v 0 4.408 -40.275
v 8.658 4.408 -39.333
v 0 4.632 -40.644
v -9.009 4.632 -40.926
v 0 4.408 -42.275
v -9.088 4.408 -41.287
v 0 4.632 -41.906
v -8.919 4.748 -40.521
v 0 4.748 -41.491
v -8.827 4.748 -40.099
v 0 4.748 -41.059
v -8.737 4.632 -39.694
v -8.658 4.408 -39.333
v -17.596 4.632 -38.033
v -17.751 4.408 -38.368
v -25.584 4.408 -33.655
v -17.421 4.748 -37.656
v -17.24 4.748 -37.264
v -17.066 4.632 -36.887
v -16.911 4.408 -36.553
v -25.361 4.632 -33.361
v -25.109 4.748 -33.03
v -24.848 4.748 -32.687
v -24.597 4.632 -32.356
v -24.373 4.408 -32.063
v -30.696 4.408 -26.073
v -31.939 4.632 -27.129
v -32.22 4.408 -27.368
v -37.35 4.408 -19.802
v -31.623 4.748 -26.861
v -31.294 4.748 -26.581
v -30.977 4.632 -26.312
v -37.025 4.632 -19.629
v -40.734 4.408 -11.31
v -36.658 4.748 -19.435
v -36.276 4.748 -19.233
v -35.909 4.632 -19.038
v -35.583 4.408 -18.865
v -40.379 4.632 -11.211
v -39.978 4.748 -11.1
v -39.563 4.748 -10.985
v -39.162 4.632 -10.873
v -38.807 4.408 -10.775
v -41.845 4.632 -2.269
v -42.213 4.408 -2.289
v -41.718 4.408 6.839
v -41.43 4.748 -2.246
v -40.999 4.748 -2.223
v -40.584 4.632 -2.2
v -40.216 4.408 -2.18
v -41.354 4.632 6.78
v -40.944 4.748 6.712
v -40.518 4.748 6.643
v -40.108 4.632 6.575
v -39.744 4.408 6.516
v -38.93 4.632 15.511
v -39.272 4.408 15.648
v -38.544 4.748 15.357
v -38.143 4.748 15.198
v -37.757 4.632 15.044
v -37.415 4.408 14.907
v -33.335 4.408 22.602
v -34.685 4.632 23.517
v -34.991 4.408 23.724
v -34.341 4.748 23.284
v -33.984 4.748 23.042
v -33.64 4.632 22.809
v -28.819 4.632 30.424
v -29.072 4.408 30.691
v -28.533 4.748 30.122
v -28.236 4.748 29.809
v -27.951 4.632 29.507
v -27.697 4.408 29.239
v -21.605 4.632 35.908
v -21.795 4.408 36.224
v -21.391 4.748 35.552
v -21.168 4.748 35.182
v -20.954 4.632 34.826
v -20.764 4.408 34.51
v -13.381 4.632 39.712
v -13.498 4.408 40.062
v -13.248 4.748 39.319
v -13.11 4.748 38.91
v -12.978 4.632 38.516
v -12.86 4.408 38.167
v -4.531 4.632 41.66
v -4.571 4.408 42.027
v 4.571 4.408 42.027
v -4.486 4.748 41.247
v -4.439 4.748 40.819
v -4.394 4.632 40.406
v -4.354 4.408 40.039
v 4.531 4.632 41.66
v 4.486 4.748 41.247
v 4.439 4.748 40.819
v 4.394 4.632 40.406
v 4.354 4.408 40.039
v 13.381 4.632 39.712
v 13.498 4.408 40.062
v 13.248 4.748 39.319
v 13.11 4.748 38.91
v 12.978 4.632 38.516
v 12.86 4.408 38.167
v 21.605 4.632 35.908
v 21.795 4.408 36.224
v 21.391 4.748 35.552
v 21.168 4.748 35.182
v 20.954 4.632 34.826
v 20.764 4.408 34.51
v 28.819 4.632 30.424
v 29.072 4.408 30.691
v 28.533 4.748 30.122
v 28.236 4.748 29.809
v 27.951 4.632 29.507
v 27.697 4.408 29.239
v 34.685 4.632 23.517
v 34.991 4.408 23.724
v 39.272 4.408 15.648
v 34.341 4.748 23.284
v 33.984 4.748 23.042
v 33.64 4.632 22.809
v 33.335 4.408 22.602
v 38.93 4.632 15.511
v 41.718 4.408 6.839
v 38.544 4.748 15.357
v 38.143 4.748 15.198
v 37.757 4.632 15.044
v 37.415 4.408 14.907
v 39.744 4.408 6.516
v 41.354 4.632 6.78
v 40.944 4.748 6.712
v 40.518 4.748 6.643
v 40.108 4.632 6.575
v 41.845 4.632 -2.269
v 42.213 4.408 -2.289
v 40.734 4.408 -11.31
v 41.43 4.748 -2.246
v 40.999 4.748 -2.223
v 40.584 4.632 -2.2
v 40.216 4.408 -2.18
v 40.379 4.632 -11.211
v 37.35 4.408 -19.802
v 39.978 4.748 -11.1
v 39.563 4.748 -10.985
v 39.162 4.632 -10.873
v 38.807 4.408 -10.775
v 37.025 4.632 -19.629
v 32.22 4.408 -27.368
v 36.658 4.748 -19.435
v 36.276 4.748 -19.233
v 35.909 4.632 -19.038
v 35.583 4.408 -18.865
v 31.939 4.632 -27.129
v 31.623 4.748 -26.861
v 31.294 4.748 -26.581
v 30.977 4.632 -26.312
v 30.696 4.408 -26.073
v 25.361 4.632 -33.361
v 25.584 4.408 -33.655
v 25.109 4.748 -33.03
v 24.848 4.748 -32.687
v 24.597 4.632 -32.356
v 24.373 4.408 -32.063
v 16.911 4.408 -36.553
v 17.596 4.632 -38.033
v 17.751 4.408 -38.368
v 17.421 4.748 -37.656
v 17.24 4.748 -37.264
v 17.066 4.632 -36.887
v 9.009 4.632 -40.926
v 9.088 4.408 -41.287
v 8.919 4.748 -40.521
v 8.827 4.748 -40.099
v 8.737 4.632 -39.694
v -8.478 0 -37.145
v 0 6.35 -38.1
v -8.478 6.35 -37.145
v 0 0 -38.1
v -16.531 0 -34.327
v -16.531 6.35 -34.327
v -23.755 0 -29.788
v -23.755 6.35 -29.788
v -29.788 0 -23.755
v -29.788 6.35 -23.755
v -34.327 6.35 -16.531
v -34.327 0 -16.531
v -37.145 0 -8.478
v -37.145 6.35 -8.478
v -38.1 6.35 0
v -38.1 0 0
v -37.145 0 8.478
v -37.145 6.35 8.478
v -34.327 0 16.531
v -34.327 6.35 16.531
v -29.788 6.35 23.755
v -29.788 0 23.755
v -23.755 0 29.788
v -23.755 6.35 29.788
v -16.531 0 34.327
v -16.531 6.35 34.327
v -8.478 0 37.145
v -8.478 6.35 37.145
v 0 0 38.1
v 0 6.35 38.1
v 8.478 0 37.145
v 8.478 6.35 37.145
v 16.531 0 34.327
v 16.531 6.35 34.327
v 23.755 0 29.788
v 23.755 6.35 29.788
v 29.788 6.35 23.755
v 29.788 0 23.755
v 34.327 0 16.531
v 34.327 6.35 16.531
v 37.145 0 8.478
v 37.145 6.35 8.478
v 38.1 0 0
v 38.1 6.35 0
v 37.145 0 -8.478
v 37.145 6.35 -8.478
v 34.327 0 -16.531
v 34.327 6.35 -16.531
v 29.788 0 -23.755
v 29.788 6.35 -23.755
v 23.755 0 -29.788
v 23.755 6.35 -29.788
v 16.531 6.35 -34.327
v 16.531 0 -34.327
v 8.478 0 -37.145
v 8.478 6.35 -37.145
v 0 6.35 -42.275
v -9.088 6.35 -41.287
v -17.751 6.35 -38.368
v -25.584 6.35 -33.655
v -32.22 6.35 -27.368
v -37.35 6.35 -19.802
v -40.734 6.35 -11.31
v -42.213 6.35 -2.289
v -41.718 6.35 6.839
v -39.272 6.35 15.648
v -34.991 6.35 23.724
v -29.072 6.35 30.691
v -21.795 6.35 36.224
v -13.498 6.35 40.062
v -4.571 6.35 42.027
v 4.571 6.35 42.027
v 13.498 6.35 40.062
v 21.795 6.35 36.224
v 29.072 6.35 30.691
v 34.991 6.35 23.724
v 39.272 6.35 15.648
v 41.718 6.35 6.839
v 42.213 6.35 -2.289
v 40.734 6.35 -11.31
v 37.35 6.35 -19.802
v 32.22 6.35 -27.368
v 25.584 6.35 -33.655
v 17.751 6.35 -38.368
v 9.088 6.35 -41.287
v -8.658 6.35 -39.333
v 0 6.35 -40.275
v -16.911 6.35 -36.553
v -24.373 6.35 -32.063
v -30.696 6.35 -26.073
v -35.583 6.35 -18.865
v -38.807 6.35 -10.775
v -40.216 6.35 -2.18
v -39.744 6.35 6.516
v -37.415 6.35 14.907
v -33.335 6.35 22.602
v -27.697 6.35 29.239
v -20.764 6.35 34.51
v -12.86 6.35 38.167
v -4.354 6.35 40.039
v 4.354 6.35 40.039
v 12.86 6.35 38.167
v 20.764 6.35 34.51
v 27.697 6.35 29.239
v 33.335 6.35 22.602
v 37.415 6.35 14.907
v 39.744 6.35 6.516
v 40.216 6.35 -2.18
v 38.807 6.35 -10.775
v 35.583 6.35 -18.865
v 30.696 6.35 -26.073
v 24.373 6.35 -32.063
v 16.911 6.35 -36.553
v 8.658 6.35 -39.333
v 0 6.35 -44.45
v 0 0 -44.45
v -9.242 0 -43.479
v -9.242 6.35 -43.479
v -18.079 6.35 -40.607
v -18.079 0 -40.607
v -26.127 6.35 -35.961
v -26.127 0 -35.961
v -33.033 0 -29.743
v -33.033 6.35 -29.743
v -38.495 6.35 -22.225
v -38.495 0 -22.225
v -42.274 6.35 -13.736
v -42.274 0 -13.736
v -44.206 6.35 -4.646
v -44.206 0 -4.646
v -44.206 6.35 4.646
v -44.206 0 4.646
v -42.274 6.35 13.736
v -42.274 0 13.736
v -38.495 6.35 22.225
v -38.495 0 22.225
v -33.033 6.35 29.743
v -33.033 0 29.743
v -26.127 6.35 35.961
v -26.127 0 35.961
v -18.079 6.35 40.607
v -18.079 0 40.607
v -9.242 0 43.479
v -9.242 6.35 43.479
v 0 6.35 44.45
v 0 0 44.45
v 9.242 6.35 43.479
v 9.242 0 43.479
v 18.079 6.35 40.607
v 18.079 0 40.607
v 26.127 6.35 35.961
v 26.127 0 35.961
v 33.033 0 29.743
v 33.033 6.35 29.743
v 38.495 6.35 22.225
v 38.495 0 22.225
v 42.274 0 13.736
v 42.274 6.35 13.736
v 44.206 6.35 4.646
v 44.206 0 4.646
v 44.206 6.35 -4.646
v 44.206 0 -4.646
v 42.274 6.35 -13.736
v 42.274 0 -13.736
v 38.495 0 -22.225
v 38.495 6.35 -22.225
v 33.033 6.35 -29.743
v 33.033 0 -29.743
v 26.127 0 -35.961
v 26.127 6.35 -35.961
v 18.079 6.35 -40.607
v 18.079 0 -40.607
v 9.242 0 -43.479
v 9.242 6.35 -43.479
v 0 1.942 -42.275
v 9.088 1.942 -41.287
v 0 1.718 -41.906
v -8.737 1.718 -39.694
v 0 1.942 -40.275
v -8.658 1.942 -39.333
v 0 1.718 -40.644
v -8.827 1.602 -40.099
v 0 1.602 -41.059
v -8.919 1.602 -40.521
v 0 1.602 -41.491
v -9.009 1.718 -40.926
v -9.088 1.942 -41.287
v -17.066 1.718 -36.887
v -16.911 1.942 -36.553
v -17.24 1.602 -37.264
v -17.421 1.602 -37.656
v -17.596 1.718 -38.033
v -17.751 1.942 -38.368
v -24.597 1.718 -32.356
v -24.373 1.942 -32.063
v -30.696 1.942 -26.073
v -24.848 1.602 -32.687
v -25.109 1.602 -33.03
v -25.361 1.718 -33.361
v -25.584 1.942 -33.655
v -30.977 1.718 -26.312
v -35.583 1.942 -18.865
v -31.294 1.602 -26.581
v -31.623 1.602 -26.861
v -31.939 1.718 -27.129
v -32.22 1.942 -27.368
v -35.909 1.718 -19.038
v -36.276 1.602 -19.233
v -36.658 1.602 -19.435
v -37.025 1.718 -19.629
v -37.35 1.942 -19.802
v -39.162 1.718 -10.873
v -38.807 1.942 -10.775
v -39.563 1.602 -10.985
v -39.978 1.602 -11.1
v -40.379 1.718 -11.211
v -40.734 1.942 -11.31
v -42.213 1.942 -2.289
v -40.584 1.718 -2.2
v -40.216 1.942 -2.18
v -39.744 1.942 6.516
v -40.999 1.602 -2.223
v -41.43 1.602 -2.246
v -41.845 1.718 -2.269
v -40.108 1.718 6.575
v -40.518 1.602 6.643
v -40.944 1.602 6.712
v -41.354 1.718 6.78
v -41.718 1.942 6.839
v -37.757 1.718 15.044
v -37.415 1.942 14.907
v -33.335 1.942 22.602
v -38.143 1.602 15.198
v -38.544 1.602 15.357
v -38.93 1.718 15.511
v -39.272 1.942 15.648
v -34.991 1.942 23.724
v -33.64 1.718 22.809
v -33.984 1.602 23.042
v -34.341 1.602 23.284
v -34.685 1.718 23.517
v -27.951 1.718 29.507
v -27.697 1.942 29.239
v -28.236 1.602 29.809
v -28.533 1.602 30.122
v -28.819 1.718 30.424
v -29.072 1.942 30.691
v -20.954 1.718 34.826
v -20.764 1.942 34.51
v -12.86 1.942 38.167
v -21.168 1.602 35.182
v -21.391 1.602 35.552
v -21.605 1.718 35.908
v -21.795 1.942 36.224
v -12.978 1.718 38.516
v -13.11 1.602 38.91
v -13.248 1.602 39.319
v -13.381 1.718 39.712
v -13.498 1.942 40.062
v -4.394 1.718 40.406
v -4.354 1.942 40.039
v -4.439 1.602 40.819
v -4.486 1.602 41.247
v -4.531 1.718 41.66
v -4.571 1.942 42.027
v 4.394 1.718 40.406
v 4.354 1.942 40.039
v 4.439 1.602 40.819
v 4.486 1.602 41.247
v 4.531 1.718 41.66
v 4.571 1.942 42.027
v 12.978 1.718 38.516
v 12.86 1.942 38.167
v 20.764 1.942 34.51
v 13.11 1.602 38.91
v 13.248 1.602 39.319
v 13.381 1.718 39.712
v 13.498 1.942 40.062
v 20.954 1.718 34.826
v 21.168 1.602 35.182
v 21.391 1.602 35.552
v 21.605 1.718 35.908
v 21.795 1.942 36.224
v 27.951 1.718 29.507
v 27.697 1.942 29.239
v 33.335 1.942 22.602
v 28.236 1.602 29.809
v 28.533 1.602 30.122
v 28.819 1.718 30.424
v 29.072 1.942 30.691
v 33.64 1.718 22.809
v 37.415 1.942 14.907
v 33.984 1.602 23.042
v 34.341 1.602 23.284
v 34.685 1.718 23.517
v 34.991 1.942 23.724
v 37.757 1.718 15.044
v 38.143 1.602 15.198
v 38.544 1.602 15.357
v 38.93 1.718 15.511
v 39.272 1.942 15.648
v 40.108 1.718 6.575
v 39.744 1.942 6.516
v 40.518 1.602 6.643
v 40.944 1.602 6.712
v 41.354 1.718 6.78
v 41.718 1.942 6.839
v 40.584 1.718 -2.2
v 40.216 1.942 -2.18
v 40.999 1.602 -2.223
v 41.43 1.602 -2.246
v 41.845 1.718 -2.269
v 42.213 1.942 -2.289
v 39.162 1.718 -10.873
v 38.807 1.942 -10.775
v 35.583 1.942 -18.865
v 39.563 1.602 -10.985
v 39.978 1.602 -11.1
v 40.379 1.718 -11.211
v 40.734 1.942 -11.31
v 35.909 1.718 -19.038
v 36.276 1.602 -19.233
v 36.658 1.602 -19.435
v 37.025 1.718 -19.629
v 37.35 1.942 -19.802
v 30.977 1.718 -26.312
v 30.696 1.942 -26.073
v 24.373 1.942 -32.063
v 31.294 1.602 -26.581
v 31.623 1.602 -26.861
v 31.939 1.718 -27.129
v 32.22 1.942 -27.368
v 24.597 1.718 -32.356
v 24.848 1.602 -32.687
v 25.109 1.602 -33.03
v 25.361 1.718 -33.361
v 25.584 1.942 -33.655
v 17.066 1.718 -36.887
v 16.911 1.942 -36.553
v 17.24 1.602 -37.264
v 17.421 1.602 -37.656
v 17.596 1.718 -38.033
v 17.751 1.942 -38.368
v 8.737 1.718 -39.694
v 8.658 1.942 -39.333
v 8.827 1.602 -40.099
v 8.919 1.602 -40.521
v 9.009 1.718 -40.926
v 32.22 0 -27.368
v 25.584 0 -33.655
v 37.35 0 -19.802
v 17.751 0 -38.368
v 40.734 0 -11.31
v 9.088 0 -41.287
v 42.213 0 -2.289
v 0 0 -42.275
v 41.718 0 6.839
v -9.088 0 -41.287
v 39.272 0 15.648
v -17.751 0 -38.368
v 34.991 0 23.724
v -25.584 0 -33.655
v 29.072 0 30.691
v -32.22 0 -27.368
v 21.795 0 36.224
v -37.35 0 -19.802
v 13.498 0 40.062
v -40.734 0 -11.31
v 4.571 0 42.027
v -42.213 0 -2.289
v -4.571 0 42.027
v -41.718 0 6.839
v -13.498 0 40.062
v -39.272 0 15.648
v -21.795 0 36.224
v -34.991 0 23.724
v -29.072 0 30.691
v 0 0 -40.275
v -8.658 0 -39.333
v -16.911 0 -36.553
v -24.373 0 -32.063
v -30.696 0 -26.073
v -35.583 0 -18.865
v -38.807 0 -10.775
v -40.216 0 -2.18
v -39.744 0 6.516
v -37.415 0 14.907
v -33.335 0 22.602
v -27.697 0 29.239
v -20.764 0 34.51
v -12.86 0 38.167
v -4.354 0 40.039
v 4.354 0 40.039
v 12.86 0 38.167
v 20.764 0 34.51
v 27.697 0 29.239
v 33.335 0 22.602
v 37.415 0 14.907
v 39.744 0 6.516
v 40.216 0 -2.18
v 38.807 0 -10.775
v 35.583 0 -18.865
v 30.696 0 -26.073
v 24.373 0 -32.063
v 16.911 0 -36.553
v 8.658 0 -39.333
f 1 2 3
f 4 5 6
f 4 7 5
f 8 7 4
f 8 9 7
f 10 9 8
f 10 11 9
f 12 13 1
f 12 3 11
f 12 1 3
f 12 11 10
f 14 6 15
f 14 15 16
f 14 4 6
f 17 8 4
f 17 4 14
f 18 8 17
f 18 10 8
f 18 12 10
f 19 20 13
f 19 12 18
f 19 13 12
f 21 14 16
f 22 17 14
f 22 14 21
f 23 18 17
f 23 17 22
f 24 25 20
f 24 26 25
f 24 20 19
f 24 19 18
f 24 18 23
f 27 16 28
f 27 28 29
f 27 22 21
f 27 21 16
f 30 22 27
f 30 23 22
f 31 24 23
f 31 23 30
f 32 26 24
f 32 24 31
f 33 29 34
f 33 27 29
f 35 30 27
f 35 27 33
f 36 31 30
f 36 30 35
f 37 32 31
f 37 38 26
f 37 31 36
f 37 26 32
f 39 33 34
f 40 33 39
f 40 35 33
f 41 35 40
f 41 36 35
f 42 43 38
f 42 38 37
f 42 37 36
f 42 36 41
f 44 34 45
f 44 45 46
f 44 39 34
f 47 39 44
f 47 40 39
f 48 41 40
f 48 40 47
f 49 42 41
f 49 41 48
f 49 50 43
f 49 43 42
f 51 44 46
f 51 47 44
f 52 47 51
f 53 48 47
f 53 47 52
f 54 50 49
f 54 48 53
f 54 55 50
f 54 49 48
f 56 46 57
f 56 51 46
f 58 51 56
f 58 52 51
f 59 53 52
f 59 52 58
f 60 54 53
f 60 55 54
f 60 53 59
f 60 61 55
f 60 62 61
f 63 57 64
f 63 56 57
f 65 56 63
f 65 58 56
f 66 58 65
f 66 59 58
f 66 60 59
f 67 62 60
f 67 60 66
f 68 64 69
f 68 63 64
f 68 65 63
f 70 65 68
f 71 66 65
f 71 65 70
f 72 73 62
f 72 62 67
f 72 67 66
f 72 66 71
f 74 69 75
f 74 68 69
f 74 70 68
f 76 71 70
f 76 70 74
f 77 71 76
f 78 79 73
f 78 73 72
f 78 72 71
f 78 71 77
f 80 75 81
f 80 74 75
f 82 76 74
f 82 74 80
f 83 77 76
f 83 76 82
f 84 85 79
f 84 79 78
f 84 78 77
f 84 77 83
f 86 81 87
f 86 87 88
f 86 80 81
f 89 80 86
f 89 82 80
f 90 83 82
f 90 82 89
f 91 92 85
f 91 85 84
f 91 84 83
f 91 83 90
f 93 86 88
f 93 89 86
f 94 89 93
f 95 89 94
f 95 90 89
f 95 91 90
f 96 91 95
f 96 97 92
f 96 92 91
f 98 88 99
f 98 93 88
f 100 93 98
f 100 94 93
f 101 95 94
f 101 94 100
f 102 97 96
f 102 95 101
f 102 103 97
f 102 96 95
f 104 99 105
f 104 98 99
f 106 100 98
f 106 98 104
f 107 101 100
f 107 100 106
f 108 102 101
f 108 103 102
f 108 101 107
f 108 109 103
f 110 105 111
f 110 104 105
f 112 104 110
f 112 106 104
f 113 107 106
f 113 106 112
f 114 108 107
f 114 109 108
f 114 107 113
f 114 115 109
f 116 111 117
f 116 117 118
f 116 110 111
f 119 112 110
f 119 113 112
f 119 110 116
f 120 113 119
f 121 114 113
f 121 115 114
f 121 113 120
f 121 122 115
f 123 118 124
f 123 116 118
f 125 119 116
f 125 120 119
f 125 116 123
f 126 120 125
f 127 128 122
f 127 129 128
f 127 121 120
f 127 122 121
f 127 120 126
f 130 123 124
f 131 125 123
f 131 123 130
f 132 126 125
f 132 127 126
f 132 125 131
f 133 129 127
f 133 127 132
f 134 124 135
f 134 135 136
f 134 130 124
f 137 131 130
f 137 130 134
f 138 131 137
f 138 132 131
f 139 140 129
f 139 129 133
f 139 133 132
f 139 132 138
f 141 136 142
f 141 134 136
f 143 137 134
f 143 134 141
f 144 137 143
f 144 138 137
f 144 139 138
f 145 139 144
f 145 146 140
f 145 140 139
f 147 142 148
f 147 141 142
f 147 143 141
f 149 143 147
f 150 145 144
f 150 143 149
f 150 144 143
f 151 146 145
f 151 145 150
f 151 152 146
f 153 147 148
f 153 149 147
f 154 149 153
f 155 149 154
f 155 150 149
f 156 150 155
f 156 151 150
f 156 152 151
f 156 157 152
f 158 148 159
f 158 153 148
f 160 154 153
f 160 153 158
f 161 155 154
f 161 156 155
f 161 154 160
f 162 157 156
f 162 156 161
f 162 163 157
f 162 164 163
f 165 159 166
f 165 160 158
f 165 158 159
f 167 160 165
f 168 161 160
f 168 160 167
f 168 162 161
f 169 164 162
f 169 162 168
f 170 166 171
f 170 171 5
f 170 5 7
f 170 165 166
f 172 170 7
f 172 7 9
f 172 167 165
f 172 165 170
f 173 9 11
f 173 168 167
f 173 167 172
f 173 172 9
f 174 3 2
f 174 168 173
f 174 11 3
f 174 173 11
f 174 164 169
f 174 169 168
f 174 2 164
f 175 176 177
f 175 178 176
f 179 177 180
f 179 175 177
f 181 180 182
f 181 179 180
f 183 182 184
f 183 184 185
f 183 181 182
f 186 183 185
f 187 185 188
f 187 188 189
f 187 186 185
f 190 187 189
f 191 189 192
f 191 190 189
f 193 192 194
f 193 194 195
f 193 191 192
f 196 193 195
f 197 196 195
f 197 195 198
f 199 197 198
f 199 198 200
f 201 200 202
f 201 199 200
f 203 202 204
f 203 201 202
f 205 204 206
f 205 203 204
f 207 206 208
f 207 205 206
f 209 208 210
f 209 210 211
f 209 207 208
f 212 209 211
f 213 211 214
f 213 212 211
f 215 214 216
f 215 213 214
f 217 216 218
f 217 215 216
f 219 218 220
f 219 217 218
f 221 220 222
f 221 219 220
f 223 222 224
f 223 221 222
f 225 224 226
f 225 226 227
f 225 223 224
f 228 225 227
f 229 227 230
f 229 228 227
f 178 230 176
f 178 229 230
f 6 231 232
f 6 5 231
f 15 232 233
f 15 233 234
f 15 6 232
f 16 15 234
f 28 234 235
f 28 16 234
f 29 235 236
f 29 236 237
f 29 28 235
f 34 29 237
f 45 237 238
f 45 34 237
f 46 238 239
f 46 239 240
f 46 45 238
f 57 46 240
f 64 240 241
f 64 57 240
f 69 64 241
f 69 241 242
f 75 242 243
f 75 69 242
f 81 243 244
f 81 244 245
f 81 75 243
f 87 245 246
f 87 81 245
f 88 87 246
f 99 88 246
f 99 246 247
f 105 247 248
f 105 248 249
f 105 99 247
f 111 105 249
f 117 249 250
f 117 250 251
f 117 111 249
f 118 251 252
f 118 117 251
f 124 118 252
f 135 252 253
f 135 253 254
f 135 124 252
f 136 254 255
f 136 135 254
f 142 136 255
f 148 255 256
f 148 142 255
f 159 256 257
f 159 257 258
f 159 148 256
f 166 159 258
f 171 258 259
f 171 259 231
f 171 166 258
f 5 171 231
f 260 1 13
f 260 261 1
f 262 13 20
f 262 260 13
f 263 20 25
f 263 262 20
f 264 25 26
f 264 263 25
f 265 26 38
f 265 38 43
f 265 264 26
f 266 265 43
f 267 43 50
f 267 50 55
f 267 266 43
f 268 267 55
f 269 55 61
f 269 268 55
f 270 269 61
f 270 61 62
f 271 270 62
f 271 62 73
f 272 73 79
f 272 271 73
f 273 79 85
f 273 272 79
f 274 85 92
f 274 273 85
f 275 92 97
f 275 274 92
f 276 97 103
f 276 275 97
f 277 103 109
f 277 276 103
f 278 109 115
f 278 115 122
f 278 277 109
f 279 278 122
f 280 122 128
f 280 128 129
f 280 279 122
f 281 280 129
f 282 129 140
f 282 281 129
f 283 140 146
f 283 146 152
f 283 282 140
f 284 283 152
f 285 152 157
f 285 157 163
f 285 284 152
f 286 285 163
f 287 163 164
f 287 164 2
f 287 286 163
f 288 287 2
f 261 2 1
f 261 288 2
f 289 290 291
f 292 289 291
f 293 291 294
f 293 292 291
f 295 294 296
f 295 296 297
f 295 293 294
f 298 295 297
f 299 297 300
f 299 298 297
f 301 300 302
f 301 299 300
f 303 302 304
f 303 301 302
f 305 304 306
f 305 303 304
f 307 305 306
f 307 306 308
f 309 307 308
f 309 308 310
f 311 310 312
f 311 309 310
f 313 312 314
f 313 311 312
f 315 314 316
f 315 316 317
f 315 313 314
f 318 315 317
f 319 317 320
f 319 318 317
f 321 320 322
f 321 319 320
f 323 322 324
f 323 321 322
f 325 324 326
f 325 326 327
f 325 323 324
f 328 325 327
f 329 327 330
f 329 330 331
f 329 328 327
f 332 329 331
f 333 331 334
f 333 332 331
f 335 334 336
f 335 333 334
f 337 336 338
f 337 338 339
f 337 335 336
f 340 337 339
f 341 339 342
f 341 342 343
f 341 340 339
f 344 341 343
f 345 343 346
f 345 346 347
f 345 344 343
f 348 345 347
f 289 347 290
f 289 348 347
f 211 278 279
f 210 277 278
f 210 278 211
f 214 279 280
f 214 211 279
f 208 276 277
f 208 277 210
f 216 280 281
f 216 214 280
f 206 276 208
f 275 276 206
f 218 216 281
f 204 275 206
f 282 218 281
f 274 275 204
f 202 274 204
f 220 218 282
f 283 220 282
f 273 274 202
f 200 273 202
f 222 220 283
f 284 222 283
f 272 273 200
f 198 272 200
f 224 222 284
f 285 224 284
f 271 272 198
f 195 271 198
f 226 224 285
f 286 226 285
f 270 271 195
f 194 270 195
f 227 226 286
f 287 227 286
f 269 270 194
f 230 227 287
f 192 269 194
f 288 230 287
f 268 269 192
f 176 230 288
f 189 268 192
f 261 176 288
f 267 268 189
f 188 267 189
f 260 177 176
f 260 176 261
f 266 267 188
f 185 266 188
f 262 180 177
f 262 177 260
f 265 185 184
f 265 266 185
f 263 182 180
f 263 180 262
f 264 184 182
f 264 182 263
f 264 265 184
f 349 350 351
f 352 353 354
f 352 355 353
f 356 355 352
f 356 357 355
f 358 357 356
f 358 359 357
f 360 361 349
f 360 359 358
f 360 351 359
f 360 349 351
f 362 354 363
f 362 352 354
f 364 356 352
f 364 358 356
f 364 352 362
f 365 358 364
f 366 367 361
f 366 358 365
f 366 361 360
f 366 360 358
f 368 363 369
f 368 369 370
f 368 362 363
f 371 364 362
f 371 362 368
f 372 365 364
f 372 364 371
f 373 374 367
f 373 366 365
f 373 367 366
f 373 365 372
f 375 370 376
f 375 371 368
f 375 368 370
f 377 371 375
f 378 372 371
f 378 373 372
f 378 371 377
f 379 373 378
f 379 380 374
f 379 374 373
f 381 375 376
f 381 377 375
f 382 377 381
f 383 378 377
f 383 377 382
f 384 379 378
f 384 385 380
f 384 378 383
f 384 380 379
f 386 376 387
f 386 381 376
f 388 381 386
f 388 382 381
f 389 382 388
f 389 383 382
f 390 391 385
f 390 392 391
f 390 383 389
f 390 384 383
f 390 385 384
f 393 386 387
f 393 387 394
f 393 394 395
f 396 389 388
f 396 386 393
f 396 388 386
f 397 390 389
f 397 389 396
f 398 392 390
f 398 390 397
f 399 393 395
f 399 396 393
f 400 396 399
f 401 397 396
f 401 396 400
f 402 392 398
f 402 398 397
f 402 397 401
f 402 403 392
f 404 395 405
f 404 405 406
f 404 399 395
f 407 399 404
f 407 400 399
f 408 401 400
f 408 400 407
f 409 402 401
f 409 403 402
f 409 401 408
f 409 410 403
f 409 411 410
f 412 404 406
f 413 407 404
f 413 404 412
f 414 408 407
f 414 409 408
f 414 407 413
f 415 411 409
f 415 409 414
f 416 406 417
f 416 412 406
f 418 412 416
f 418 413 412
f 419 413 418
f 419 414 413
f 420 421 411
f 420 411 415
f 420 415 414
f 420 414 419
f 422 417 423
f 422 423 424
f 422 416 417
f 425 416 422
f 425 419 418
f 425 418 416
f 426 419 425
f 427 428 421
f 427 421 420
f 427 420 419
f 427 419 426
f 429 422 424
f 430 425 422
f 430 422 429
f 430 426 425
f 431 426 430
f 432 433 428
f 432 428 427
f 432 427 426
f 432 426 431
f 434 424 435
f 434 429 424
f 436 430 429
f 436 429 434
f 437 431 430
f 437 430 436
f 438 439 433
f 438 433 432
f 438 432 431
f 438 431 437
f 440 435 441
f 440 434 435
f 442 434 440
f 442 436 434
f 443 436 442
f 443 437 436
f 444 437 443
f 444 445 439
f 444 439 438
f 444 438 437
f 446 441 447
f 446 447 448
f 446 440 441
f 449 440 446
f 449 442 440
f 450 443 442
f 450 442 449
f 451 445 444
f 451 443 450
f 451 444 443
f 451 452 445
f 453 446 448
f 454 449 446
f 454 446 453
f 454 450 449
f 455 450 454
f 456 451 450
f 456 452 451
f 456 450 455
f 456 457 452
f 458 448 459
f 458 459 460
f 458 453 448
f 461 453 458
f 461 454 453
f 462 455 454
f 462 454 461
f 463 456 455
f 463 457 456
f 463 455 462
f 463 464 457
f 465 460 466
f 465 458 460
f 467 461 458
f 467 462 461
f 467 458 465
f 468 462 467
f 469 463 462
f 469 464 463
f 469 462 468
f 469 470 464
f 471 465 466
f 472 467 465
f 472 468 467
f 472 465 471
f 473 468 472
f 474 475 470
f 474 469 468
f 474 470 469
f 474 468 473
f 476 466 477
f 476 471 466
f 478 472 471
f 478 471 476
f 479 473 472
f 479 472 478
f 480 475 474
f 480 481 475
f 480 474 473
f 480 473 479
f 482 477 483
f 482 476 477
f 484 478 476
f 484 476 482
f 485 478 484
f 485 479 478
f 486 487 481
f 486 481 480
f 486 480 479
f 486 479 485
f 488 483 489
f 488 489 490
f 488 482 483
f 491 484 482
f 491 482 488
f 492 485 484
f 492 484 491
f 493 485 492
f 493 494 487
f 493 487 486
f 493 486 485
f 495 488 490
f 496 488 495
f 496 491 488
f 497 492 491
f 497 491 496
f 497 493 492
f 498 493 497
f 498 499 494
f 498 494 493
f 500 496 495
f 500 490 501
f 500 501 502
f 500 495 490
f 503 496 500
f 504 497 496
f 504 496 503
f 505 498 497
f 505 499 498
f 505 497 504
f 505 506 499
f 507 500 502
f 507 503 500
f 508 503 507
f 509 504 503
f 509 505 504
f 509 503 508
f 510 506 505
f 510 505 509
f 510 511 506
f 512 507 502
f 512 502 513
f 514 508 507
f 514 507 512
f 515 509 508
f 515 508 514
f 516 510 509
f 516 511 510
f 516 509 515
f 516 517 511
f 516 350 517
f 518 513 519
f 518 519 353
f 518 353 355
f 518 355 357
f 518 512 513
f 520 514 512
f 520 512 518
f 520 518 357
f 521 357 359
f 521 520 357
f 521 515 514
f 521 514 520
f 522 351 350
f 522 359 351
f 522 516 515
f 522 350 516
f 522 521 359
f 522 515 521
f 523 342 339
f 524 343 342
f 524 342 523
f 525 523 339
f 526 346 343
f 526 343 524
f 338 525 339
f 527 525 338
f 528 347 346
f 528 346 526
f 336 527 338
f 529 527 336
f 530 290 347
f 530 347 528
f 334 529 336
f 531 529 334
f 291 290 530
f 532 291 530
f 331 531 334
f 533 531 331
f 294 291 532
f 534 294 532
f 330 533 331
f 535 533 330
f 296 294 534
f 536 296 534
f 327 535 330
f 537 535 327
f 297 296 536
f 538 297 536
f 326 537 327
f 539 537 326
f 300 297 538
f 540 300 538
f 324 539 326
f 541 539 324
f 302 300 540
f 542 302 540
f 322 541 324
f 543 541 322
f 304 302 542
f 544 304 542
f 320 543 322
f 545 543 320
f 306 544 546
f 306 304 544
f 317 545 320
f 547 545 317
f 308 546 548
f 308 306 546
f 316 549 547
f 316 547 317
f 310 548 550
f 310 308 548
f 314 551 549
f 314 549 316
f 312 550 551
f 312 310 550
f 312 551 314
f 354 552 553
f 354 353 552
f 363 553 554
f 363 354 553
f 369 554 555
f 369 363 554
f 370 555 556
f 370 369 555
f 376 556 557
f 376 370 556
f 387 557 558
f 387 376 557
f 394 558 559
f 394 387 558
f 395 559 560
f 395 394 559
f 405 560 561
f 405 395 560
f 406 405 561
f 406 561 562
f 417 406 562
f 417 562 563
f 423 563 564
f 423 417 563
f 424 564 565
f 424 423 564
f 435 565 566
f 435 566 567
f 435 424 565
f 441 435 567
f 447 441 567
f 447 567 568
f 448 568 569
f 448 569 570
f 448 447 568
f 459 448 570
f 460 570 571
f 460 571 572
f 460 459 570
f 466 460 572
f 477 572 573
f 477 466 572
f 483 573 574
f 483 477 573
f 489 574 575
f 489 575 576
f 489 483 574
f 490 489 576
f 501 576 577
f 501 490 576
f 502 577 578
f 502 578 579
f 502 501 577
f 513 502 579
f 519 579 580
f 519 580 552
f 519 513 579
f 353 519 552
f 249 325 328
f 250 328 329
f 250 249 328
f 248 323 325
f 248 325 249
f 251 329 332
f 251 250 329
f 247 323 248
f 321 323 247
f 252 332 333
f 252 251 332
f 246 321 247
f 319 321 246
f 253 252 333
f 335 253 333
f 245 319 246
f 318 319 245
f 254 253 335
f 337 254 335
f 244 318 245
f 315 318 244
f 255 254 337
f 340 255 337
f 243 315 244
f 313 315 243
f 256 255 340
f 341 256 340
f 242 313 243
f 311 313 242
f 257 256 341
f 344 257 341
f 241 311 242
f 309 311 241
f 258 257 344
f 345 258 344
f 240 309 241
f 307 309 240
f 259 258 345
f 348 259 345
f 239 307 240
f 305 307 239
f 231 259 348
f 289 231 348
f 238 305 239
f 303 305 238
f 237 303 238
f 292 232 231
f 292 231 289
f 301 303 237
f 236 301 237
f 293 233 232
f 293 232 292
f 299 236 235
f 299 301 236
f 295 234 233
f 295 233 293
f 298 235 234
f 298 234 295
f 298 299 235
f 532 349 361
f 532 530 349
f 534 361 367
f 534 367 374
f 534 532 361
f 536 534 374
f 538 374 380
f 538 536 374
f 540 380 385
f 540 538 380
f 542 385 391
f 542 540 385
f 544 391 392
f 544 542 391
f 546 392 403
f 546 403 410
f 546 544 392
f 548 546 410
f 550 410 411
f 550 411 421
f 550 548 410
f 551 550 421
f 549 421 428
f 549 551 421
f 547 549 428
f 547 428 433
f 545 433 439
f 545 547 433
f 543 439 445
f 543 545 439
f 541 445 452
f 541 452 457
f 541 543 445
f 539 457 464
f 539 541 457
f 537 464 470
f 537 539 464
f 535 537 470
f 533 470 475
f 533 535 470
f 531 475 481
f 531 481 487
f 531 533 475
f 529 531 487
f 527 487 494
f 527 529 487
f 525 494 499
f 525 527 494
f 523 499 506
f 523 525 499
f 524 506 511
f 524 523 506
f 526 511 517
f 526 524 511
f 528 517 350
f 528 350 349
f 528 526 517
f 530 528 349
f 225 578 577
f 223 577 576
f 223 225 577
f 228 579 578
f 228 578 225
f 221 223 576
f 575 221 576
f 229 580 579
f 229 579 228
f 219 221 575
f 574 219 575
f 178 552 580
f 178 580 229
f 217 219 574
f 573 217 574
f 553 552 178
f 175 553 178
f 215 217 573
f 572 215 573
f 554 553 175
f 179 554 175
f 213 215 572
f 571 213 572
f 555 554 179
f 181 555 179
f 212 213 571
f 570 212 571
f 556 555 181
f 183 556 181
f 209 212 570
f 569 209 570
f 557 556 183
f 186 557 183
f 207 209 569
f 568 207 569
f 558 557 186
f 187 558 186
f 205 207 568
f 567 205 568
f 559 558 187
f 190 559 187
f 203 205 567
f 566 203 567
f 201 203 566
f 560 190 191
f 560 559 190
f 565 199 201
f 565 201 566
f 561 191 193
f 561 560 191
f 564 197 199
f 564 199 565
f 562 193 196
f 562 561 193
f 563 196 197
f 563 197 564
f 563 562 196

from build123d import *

# Parameters (mm, degrees)
SKETCH_1_R = 1.5875


with BuildPart() as part:
    # 草图1 → 旋转1 (revolve)
    with BuildSketch(Plane.XY, mode=Mode.PRIVATE) as revolve_1_sk:
        with BuildLine():
            Line((42.275, 6.35), (42.275, 4.407946167))
            ThreePointArc((42.275, 4.407946167), (42.708118322, 3.857882219), (42.8625, 3.175))
            ThreePointArc((42.8625, 3.175), (42.708118322, 2.492117781), (42.275, 1.942053833))
            Line((42.275, 1.942053833), (42.275, 0))
            Line((42.275, 0), (44.45, 0))
            Line((44.45, 0), (44.45, 6.1))
            Line((44.45, 6.1), (44.45, 6.35))
            Line((44.45, 6.35), (42.275, 6.35))
        make_face()
        with BuildLine():
            Line((40.275, 6.35), (38.1, 6.35))
            Line((38.1, 6.35), (38.1, 6.1))
            Line((38.1, 6.1), (38.1, 0))
            Line((38.1, 0), (40.275, 0))
            Line((40.275, 0), (40.275, 1.942053833))
            ThreePointArc((40.275, 1.942053833), (39.6875, 3.175), (40.275, 4.407946167))
            Line((40.275, 4.407946167), (40.275, 6.35))
        make_face()
        with Locations((41.275, 3.175)):
            Circle(SKETCH_1_R)
    revolve(revolve_1_sk.sketch.rotate(Axis((0, 13.35, 0), (0, 1, 0)), 90), axis=Axis((0, 13.35, 0), (0, 1, 0)))


solid = part.part
